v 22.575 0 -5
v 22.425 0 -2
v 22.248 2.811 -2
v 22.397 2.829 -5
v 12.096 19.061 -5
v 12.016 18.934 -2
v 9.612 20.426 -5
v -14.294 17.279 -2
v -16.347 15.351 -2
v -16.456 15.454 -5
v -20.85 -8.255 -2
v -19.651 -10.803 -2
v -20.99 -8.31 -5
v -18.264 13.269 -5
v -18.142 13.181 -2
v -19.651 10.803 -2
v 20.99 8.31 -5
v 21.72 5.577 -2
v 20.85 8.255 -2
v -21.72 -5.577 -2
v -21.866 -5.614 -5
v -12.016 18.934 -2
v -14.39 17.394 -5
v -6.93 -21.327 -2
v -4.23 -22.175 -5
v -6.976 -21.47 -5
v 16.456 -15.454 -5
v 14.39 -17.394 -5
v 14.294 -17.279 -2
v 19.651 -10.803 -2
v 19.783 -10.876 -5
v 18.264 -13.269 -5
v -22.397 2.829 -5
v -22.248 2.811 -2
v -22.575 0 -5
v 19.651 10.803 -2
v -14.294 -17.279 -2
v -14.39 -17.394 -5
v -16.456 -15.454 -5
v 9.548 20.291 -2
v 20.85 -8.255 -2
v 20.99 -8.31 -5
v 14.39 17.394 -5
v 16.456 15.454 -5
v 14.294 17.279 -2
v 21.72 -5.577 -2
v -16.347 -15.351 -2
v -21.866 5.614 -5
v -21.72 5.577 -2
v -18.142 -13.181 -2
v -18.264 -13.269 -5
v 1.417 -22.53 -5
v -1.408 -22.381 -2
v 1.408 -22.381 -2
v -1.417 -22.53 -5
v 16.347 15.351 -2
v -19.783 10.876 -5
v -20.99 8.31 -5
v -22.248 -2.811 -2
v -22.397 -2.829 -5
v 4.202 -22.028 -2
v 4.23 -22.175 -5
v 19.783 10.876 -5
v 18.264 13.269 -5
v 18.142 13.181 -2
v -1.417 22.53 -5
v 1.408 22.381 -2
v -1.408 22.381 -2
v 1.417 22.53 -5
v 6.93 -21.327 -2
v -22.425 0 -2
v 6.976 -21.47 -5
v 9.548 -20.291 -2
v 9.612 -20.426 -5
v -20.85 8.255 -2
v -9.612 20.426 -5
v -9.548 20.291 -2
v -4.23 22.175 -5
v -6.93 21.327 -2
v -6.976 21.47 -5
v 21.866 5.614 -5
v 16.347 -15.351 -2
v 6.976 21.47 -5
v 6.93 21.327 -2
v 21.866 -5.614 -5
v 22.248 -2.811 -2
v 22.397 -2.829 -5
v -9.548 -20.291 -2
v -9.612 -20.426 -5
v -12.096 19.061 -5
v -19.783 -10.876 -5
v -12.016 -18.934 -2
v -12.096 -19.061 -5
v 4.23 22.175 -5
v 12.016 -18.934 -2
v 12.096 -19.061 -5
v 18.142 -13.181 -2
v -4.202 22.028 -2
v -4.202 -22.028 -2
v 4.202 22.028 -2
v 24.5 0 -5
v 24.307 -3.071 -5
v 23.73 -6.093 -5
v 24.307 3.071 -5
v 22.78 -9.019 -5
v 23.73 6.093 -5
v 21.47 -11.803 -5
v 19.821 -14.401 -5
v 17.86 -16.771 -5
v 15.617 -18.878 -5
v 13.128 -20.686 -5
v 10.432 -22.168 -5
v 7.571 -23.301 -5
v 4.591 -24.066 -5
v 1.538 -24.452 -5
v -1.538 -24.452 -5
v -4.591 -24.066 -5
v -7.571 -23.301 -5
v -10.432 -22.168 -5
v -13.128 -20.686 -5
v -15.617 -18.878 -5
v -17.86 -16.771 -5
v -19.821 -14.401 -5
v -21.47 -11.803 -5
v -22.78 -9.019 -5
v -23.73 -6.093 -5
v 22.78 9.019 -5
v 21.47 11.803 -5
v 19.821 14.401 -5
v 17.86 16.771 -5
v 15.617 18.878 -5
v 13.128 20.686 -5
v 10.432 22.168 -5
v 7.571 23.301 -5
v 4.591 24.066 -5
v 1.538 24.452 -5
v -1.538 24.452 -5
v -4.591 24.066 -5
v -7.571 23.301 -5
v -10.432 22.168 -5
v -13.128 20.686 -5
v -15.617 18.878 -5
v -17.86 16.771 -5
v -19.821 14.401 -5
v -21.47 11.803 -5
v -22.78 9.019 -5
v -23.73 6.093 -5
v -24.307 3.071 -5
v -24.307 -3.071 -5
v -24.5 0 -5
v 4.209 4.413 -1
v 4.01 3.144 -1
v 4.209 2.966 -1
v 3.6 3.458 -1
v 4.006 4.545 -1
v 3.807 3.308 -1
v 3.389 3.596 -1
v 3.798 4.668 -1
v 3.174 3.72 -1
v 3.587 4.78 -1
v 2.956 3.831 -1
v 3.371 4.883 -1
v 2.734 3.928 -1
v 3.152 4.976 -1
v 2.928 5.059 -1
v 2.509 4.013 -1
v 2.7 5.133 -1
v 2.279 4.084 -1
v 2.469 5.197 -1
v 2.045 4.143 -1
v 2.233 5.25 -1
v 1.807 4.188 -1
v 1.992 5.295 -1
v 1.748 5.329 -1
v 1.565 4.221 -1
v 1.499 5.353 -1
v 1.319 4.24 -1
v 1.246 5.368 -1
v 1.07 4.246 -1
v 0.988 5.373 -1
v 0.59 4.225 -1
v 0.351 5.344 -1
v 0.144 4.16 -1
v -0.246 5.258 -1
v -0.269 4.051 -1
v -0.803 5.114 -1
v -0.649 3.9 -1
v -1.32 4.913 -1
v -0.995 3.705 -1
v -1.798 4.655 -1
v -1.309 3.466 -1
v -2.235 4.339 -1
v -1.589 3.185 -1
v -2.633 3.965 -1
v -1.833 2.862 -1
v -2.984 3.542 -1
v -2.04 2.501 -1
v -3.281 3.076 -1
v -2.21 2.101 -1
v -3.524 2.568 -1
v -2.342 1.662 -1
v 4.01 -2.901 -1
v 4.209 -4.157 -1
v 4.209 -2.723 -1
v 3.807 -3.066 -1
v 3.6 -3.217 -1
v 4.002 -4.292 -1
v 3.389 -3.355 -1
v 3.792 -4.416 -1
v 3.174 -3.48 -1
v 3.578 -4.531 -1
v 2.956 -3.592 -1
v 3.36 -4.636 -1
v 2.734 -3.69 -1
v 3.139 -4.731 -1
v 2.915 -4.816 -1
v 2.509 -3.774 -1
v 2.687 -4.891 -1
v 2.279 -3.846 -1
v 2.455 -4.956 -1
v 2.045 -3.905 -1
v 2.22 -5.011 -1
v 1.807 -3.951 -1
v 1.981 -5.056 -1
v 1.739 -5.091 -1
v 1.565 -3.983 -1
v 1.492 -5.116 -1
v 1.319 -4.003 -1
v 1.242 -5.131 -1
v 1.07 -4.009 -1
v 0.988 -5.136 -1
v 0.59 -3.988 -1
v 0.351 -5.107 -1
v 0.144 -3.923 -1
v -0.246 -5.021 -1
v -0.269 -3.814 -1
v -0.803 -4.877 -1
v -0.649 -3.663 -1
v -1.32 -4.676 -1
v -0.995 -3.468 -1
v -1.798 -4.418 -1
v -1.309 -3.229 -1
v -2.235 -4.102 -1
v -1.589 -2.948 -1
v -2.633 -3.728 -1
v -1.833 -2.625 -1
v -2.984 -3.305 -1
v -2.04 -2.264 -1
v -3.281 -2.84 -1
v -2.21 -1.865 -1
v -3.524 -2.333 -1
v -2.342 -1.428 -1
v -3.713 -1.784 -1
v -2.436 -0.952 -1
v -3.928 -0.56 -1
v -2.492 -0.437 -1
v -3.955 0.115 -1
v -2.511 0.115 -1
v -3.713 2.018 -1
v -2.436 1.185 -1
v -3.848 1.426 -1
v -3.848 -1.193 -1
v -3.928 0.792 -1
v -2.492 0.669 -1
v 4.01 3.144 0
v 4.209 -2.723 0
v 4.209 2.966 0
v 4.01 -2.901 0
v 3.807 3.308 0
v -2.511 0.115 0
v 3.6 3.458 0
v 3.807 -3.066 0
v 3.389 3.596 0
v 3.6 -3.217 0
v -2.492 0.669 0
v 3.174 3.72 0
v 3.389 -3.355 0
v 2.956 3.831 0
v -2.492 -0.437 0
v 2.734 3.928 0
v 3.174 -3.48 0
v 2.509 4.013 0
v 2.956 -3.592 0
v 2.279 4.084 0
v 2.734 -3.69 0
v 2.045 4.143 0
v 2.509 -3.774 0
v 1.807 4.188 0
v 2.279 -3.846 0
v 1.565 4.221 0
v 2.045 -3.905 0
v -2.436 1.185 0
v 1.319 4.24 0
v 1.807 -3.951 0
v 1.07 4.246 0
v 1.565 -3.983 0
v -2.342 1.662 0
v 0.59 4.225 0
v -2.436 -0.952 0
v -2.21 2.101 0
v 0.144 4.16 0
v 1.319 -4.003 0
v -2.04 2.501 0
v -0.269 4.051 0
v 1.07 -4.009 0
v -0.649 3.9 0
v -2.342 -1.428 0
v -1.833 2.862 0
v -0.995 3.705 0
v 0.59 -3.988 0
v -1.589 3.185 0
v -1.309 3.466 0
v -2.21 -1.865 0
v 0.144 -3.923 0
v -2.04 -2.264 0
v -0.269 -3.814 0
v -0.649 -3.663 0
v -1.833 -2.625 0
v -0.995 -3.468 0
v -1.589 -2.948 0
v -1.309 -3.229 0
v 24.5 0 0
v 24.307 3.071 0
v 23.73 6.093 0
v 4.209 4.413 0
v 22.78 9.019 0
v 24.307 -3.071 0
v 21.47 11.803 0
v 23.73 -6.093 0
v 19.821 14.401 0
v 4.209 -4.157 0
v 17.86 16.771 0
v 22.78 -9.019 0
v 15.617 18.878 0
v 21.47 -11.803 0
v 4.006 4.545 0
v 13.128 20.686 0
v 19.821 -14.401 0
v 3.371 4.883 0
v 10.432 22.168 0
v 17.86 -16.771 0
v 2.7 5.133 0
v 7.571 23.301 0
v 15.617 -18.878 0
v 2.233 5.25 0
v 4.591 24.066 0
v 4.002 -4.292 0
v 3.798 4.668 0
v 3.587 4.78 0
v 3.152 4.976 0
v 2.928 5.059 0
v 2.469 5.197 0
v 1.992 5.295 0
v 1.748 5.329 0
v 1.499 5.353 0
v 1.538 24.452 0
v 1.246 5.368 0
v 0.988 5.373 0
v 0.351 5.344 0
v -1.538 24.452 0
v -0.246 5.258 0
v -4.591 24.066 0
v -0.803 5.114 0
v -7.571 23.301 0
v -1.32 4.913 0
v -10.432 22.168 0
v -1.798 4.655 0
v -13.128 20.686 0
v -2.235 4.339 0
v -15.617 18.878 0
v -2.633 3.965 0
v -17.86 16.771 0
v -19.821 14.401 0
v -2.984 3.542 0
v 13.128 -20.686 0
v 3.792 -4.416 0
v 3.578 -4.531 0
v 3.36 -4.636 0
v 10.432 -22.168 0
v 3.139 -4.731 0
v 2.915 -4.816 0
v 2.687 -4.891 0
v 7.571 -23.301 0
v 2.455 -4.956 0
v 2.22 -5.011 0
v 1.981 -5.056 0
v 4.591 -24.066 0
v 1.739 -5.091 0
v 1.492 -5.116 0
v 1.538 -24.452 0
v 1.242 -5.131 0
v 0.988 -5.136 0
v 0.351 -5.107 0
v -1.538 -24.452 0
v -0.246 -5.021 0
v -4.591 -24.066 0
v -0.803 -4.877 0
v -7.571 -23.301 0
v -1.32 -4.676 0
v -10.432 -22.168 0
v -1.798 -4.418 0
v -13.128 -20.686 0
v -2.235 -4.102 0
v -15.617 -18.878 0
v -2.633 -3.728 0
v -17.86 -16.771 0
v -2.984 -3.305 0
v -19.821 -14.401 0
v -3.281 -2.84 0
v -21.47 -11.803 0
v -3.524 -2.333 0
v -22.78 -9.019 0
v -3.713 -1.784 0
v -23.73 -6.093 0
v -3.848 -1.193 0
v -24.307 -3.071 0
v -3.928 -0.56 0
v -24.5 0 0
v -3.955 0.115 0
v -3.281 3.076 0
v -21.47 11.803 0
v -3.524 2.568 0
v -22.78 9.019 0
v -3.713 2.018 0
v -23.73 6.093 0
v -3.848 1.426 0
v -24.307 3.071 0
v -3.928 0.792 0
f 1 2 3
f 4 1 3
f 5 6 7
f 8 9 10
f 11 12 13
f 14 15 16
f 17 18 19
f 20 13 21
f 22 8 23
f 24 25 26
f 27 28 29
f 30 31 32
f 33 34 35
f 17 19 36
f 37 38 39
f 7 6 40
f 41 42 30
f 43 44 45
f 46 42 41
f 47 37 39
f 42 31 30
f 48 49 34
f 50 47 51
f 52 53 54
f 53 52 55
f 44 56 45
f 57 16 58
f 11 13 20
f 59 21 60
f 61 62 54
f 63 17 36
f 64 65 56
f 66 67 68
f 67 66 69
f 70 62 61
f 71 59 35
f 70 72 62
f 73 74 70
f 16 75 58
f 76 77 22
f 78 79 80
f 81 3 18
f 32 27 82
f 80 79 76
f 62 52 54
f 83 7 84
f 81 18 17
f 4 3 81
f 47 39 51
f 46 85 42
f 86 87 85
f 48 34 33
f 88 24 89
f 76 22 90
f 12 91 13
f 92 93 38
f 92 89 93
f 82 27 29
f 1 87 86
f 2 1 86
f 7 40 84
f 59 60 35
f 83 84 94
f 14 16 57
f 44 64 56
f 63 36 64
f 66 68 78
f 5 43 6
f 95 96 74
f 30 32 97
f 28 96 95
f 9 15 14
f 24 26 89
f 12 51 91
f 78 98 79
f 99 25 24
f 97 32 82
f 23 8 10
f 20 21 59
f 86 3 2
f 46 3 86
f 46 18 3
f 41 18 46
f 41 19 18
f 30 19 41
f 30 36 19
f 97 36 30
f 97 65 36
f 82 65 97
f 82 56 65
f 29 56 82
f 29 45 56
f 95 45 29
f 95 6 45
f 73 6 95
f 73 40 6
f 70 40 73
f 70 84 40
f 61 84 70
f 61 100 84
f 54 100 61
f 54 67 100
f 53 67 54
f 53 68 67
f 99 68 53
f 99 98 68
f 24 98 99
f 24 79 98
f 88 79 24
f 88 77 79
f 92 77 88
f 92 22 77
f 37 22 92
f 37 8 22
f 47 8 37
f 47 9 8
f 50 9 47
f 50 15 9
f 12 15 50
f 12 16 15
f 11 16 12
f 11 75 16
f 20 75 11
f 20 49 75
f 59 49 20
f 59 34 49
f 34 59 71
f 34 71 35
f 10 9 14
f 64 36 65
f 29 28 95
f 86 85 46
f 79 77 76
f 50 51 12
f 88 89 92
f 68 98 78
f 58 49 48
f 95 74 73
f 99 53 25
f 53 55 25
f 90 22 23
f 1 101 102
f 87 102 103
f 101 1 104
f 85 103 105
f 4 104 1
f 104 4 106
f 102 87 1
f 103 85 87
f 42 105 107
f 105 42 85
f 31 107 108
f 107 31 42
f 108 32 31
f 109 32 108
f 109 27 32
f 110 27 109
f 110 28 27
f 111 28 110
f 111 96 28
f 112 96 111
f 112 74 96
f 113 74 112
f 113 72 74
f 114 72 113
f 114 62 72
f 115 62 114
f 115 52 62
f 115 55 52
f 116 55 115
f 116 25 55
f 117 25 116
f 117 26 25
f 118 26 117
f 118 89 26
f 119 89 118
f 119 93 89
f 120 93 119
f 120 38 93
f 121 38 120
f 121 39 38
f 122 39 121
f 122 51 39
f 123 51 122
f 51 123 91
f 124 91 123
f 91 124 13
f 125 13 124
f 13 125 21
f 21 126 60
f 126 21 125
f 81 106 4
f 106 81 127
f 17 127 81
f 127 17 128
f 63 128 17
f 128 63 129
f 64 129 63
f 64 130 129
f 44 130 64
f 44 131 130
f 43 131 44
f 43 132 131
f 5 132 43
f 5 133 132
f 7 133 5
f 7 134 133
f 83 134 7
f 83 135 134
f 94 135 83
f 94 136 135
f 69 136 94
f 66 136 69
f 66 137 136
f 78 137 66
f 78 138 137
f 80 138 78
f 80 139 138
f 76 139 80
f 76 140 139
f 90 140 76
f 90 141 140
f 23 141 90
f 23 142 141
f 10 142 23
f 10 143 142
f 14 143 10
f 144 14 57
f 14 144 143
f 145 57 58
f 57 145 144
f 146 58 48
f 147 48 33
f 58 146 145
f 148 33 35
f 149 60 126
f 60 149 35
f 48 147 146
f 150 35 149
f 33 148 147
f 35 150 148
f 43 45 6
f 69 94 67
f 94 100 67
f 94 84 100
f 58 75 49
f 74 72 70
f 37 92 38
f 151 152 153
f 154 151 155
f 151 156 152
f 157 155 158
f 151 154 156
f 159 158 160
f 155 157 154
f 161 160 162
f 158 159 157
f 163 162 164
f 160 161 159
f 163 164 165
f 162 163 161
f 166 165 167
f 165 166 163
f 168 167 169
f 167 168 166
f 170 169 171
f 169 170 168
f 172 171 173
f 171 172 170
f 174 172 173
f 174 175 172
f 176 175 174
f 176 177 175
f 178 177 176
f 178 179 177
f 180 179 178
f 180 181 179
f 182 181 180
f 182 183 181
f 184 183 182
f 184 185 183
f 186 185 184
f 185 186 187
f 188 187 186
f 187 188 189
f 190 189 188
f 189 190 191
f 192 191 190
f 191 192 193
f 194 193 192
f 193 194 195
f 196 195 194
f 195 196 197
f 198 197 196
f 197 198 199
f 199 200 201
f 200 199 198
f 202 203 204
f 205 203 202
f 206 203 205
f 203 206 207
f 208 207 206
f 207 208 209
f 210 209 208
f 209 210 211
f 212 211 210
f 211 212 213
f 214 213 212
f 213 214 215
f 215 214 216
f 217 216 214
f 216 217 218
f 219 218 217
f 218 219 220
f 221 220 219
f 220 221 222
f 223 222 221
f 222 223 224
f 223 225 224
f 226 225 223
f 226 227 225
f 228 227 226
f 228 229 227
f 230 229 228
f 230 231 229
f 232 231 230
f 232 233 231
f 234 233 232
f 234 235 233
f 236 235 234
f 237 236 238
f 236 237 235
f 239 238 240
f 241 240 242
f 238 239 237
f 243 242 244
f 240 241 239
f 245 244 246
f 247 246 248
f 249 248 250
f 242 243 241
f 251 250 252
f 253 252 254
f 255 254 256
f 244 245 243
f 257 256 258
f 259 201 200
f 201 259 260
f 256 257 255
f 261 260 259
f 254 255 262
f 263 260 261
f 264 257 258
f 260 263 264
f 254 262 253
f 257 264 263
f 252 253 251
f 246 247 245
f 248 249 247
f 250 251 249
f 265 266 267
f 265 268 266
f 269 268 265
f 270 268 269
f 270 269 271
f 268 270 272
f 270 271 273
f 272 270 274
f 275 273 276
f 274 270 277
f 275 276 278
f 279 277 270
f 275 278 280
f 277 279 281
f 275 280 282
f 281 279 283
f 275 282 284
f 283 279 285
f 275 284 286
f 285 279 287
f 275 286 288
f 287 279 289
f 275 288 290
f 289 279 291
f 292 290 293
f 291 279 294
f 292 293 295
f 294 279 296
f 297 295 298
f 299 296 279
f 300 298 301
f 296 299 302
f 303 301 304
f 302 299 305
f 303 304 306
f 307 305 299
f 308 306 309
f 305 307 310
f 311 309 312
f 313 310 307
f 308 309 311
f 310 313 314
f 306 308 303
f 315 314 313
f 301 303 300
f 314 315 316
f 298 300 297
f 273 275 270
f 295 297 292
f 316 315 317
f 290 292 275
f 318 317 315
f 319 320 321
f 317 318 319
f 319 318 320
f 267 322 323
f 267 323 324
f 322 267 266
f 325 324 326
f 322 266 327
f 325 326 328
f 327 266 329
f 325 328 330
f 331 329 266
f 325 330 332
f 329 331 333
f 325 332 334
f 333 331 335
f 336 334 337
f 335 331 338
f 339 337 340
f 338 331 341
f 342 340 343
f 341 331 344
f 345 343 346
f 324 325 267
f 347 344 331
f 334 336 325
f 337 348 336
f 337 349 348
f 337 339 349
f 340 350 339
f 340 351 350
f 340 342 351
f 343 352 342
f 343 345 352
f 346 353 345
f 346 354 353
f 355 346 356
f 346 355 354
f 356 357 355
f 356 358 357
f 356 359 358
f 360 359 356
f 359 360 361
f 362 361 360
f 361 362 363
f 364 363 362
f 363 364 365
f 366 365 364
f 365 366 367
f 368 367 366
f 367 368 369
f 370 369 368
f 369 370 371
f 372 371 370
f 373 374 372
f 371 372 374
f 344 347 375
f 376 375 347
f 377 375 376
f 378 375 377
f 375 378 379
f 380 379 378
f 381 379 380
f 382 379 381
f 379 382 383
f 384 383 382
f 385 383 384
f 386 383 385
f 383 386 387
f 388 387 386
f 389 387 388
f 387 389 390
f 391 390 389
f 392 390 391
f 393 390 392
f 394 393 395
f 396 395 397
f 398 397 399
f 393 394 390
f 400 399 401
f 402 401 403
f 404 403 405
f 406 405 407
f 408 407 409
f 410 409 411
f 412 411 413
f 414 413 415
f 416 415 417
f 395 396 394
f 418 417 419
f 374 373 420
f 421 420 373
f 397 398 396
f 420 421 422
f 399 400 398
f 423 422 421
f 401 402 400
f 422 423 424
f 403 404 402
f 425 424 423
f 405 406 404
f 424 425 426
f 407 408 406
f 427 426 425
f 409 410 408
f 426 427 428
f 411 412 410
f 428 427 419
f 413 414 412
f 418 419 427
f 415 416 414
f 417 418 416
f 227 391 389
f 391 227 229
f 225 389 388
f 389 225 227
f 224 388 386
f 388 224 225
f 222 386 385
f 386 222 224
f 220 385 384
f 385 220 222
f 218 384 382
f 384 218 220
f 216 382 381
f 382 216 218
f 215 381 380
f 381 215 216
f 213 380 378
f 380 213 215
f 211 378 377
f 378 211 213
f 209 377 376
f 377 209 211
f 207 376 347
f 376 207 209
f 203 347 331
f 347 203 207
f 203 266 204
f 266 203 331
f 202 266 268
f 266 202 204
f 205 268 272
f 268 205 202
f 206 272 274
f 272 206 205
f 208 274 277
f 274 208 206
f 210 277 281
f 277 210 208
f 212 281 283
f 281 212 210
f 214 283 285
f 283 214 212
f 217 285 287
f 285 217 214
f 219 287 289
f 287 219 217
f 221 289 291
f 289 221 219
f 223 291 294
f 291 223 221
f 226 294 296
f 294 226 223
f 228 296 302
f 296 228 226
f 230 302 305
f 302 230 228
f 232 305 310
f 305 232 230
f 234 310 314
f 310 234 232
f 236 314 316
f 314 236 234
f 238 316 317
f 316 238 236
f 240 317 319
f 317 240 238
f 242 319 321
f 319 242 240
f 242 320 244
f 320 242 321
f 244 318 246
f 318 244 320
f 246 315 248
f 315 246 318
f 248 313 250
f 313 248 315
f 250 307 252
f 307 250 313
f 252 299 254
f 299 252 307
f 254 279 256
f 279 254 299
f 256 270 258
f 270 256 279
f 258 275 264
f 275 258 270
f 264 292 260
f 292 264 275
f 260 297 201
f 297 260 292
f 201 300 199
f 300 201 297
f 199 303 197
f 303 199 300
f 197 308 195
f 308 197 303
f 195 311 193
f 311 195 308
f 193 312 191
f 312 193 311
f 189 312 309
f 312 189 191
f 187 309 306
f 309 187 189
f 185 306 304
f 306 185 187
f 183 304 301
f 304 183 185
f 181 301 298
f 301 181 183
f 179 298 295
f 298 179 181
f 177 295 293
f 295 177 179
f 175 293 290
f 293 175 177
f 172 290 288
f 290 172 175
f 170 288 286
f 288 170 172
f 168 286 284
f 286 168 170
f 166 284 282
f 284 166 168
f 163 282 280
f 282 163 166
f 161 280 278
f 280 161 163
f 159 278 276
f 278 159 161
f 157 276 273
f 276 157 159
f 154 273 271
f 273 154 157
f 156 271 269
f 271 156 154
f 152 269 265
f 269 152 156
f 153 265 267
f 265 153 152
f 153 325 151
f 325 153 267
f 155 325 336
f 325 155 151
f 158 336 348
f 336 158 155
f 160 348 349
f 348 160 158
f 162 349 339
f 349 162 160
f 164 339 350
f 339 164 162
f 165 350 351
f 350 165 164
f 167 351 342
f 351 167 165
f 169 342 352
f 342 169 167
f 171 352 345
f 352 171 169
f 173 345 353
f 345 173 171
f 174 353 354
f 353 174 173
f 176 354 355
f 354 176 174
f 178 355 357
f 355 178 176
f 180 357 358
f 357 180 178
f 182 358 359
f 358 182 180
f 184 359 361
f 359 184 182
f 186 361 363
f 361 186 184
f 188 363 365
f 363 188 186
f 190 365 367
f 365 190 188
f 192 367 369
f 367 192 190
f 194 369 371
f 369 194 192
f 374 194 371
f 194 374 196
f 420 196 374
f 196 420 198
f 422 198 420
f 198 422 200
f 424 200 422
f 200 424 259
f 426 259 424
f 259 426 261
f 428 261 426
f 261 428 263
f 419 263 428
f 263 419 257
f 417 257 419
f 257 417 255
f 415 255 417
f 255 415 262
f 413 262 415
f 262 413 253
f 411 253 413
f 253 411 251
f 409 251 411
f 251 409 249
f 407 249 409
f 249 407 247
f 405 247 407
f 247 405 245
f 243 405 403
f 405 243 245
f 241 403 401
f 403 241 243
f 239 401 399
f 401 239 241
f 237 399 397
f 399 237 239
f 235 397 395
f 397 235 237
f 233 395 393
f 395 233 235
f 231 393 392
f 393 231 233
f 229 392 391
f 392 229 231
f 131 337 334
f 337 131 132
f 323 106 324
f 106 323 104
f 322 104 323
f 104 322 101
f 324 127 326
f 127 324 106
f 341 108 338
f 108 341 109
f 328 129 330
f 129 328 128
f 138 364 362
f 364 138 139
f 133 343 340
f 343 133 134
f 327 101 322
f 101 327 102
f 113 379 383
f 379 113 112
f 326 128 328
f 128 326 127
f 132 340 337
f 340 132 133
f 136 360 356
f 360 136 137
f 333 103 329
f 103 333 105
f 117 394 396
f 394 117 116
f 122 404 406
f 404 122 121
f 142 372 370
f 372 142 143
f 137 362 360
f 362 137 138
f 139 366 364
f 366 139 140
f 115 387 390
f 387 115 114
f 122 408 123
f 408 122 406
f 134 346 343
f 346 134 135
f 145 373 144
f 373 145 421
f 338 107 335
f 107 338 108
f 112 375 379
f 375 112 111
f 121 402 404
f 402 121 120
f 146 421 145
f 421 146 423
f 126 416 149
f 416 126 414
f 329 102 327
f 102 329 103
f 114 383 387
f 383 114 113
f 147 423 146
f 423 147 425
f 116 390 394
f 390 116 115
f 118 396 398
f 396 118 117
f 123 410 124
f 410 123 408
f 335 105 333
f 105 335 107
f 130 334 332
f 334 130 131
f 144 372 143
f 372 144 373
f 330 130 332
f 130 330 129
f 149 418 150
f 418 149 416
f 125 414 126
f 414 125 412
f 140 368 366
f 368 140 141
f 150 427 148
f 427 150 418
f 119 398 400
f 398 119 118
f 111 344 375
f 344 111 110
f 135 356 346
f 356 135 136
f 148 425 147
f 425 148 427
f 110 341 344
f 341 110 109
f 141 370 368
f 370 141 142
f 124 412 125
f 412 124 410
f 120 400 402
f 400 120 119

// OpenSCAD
$fn = 50;

difference() {
	union() {
		translate(v = [0, 0, -5.0]) {
			cylinder(h = 5, r = 24.5);
		}
	}
	union() {
		#translate(v = [0, 0, -5.0]) {
			cylinder(h = 3, r1 = 22.575, r2 = 22.425);
		}
		translate(v = [0, 0, -1]) {
			linear_extrude(height = 1) {
				text(font = "Impact", halign = "center", size = 10, text = "C", valign = "center");
			}
		}
	}
}
